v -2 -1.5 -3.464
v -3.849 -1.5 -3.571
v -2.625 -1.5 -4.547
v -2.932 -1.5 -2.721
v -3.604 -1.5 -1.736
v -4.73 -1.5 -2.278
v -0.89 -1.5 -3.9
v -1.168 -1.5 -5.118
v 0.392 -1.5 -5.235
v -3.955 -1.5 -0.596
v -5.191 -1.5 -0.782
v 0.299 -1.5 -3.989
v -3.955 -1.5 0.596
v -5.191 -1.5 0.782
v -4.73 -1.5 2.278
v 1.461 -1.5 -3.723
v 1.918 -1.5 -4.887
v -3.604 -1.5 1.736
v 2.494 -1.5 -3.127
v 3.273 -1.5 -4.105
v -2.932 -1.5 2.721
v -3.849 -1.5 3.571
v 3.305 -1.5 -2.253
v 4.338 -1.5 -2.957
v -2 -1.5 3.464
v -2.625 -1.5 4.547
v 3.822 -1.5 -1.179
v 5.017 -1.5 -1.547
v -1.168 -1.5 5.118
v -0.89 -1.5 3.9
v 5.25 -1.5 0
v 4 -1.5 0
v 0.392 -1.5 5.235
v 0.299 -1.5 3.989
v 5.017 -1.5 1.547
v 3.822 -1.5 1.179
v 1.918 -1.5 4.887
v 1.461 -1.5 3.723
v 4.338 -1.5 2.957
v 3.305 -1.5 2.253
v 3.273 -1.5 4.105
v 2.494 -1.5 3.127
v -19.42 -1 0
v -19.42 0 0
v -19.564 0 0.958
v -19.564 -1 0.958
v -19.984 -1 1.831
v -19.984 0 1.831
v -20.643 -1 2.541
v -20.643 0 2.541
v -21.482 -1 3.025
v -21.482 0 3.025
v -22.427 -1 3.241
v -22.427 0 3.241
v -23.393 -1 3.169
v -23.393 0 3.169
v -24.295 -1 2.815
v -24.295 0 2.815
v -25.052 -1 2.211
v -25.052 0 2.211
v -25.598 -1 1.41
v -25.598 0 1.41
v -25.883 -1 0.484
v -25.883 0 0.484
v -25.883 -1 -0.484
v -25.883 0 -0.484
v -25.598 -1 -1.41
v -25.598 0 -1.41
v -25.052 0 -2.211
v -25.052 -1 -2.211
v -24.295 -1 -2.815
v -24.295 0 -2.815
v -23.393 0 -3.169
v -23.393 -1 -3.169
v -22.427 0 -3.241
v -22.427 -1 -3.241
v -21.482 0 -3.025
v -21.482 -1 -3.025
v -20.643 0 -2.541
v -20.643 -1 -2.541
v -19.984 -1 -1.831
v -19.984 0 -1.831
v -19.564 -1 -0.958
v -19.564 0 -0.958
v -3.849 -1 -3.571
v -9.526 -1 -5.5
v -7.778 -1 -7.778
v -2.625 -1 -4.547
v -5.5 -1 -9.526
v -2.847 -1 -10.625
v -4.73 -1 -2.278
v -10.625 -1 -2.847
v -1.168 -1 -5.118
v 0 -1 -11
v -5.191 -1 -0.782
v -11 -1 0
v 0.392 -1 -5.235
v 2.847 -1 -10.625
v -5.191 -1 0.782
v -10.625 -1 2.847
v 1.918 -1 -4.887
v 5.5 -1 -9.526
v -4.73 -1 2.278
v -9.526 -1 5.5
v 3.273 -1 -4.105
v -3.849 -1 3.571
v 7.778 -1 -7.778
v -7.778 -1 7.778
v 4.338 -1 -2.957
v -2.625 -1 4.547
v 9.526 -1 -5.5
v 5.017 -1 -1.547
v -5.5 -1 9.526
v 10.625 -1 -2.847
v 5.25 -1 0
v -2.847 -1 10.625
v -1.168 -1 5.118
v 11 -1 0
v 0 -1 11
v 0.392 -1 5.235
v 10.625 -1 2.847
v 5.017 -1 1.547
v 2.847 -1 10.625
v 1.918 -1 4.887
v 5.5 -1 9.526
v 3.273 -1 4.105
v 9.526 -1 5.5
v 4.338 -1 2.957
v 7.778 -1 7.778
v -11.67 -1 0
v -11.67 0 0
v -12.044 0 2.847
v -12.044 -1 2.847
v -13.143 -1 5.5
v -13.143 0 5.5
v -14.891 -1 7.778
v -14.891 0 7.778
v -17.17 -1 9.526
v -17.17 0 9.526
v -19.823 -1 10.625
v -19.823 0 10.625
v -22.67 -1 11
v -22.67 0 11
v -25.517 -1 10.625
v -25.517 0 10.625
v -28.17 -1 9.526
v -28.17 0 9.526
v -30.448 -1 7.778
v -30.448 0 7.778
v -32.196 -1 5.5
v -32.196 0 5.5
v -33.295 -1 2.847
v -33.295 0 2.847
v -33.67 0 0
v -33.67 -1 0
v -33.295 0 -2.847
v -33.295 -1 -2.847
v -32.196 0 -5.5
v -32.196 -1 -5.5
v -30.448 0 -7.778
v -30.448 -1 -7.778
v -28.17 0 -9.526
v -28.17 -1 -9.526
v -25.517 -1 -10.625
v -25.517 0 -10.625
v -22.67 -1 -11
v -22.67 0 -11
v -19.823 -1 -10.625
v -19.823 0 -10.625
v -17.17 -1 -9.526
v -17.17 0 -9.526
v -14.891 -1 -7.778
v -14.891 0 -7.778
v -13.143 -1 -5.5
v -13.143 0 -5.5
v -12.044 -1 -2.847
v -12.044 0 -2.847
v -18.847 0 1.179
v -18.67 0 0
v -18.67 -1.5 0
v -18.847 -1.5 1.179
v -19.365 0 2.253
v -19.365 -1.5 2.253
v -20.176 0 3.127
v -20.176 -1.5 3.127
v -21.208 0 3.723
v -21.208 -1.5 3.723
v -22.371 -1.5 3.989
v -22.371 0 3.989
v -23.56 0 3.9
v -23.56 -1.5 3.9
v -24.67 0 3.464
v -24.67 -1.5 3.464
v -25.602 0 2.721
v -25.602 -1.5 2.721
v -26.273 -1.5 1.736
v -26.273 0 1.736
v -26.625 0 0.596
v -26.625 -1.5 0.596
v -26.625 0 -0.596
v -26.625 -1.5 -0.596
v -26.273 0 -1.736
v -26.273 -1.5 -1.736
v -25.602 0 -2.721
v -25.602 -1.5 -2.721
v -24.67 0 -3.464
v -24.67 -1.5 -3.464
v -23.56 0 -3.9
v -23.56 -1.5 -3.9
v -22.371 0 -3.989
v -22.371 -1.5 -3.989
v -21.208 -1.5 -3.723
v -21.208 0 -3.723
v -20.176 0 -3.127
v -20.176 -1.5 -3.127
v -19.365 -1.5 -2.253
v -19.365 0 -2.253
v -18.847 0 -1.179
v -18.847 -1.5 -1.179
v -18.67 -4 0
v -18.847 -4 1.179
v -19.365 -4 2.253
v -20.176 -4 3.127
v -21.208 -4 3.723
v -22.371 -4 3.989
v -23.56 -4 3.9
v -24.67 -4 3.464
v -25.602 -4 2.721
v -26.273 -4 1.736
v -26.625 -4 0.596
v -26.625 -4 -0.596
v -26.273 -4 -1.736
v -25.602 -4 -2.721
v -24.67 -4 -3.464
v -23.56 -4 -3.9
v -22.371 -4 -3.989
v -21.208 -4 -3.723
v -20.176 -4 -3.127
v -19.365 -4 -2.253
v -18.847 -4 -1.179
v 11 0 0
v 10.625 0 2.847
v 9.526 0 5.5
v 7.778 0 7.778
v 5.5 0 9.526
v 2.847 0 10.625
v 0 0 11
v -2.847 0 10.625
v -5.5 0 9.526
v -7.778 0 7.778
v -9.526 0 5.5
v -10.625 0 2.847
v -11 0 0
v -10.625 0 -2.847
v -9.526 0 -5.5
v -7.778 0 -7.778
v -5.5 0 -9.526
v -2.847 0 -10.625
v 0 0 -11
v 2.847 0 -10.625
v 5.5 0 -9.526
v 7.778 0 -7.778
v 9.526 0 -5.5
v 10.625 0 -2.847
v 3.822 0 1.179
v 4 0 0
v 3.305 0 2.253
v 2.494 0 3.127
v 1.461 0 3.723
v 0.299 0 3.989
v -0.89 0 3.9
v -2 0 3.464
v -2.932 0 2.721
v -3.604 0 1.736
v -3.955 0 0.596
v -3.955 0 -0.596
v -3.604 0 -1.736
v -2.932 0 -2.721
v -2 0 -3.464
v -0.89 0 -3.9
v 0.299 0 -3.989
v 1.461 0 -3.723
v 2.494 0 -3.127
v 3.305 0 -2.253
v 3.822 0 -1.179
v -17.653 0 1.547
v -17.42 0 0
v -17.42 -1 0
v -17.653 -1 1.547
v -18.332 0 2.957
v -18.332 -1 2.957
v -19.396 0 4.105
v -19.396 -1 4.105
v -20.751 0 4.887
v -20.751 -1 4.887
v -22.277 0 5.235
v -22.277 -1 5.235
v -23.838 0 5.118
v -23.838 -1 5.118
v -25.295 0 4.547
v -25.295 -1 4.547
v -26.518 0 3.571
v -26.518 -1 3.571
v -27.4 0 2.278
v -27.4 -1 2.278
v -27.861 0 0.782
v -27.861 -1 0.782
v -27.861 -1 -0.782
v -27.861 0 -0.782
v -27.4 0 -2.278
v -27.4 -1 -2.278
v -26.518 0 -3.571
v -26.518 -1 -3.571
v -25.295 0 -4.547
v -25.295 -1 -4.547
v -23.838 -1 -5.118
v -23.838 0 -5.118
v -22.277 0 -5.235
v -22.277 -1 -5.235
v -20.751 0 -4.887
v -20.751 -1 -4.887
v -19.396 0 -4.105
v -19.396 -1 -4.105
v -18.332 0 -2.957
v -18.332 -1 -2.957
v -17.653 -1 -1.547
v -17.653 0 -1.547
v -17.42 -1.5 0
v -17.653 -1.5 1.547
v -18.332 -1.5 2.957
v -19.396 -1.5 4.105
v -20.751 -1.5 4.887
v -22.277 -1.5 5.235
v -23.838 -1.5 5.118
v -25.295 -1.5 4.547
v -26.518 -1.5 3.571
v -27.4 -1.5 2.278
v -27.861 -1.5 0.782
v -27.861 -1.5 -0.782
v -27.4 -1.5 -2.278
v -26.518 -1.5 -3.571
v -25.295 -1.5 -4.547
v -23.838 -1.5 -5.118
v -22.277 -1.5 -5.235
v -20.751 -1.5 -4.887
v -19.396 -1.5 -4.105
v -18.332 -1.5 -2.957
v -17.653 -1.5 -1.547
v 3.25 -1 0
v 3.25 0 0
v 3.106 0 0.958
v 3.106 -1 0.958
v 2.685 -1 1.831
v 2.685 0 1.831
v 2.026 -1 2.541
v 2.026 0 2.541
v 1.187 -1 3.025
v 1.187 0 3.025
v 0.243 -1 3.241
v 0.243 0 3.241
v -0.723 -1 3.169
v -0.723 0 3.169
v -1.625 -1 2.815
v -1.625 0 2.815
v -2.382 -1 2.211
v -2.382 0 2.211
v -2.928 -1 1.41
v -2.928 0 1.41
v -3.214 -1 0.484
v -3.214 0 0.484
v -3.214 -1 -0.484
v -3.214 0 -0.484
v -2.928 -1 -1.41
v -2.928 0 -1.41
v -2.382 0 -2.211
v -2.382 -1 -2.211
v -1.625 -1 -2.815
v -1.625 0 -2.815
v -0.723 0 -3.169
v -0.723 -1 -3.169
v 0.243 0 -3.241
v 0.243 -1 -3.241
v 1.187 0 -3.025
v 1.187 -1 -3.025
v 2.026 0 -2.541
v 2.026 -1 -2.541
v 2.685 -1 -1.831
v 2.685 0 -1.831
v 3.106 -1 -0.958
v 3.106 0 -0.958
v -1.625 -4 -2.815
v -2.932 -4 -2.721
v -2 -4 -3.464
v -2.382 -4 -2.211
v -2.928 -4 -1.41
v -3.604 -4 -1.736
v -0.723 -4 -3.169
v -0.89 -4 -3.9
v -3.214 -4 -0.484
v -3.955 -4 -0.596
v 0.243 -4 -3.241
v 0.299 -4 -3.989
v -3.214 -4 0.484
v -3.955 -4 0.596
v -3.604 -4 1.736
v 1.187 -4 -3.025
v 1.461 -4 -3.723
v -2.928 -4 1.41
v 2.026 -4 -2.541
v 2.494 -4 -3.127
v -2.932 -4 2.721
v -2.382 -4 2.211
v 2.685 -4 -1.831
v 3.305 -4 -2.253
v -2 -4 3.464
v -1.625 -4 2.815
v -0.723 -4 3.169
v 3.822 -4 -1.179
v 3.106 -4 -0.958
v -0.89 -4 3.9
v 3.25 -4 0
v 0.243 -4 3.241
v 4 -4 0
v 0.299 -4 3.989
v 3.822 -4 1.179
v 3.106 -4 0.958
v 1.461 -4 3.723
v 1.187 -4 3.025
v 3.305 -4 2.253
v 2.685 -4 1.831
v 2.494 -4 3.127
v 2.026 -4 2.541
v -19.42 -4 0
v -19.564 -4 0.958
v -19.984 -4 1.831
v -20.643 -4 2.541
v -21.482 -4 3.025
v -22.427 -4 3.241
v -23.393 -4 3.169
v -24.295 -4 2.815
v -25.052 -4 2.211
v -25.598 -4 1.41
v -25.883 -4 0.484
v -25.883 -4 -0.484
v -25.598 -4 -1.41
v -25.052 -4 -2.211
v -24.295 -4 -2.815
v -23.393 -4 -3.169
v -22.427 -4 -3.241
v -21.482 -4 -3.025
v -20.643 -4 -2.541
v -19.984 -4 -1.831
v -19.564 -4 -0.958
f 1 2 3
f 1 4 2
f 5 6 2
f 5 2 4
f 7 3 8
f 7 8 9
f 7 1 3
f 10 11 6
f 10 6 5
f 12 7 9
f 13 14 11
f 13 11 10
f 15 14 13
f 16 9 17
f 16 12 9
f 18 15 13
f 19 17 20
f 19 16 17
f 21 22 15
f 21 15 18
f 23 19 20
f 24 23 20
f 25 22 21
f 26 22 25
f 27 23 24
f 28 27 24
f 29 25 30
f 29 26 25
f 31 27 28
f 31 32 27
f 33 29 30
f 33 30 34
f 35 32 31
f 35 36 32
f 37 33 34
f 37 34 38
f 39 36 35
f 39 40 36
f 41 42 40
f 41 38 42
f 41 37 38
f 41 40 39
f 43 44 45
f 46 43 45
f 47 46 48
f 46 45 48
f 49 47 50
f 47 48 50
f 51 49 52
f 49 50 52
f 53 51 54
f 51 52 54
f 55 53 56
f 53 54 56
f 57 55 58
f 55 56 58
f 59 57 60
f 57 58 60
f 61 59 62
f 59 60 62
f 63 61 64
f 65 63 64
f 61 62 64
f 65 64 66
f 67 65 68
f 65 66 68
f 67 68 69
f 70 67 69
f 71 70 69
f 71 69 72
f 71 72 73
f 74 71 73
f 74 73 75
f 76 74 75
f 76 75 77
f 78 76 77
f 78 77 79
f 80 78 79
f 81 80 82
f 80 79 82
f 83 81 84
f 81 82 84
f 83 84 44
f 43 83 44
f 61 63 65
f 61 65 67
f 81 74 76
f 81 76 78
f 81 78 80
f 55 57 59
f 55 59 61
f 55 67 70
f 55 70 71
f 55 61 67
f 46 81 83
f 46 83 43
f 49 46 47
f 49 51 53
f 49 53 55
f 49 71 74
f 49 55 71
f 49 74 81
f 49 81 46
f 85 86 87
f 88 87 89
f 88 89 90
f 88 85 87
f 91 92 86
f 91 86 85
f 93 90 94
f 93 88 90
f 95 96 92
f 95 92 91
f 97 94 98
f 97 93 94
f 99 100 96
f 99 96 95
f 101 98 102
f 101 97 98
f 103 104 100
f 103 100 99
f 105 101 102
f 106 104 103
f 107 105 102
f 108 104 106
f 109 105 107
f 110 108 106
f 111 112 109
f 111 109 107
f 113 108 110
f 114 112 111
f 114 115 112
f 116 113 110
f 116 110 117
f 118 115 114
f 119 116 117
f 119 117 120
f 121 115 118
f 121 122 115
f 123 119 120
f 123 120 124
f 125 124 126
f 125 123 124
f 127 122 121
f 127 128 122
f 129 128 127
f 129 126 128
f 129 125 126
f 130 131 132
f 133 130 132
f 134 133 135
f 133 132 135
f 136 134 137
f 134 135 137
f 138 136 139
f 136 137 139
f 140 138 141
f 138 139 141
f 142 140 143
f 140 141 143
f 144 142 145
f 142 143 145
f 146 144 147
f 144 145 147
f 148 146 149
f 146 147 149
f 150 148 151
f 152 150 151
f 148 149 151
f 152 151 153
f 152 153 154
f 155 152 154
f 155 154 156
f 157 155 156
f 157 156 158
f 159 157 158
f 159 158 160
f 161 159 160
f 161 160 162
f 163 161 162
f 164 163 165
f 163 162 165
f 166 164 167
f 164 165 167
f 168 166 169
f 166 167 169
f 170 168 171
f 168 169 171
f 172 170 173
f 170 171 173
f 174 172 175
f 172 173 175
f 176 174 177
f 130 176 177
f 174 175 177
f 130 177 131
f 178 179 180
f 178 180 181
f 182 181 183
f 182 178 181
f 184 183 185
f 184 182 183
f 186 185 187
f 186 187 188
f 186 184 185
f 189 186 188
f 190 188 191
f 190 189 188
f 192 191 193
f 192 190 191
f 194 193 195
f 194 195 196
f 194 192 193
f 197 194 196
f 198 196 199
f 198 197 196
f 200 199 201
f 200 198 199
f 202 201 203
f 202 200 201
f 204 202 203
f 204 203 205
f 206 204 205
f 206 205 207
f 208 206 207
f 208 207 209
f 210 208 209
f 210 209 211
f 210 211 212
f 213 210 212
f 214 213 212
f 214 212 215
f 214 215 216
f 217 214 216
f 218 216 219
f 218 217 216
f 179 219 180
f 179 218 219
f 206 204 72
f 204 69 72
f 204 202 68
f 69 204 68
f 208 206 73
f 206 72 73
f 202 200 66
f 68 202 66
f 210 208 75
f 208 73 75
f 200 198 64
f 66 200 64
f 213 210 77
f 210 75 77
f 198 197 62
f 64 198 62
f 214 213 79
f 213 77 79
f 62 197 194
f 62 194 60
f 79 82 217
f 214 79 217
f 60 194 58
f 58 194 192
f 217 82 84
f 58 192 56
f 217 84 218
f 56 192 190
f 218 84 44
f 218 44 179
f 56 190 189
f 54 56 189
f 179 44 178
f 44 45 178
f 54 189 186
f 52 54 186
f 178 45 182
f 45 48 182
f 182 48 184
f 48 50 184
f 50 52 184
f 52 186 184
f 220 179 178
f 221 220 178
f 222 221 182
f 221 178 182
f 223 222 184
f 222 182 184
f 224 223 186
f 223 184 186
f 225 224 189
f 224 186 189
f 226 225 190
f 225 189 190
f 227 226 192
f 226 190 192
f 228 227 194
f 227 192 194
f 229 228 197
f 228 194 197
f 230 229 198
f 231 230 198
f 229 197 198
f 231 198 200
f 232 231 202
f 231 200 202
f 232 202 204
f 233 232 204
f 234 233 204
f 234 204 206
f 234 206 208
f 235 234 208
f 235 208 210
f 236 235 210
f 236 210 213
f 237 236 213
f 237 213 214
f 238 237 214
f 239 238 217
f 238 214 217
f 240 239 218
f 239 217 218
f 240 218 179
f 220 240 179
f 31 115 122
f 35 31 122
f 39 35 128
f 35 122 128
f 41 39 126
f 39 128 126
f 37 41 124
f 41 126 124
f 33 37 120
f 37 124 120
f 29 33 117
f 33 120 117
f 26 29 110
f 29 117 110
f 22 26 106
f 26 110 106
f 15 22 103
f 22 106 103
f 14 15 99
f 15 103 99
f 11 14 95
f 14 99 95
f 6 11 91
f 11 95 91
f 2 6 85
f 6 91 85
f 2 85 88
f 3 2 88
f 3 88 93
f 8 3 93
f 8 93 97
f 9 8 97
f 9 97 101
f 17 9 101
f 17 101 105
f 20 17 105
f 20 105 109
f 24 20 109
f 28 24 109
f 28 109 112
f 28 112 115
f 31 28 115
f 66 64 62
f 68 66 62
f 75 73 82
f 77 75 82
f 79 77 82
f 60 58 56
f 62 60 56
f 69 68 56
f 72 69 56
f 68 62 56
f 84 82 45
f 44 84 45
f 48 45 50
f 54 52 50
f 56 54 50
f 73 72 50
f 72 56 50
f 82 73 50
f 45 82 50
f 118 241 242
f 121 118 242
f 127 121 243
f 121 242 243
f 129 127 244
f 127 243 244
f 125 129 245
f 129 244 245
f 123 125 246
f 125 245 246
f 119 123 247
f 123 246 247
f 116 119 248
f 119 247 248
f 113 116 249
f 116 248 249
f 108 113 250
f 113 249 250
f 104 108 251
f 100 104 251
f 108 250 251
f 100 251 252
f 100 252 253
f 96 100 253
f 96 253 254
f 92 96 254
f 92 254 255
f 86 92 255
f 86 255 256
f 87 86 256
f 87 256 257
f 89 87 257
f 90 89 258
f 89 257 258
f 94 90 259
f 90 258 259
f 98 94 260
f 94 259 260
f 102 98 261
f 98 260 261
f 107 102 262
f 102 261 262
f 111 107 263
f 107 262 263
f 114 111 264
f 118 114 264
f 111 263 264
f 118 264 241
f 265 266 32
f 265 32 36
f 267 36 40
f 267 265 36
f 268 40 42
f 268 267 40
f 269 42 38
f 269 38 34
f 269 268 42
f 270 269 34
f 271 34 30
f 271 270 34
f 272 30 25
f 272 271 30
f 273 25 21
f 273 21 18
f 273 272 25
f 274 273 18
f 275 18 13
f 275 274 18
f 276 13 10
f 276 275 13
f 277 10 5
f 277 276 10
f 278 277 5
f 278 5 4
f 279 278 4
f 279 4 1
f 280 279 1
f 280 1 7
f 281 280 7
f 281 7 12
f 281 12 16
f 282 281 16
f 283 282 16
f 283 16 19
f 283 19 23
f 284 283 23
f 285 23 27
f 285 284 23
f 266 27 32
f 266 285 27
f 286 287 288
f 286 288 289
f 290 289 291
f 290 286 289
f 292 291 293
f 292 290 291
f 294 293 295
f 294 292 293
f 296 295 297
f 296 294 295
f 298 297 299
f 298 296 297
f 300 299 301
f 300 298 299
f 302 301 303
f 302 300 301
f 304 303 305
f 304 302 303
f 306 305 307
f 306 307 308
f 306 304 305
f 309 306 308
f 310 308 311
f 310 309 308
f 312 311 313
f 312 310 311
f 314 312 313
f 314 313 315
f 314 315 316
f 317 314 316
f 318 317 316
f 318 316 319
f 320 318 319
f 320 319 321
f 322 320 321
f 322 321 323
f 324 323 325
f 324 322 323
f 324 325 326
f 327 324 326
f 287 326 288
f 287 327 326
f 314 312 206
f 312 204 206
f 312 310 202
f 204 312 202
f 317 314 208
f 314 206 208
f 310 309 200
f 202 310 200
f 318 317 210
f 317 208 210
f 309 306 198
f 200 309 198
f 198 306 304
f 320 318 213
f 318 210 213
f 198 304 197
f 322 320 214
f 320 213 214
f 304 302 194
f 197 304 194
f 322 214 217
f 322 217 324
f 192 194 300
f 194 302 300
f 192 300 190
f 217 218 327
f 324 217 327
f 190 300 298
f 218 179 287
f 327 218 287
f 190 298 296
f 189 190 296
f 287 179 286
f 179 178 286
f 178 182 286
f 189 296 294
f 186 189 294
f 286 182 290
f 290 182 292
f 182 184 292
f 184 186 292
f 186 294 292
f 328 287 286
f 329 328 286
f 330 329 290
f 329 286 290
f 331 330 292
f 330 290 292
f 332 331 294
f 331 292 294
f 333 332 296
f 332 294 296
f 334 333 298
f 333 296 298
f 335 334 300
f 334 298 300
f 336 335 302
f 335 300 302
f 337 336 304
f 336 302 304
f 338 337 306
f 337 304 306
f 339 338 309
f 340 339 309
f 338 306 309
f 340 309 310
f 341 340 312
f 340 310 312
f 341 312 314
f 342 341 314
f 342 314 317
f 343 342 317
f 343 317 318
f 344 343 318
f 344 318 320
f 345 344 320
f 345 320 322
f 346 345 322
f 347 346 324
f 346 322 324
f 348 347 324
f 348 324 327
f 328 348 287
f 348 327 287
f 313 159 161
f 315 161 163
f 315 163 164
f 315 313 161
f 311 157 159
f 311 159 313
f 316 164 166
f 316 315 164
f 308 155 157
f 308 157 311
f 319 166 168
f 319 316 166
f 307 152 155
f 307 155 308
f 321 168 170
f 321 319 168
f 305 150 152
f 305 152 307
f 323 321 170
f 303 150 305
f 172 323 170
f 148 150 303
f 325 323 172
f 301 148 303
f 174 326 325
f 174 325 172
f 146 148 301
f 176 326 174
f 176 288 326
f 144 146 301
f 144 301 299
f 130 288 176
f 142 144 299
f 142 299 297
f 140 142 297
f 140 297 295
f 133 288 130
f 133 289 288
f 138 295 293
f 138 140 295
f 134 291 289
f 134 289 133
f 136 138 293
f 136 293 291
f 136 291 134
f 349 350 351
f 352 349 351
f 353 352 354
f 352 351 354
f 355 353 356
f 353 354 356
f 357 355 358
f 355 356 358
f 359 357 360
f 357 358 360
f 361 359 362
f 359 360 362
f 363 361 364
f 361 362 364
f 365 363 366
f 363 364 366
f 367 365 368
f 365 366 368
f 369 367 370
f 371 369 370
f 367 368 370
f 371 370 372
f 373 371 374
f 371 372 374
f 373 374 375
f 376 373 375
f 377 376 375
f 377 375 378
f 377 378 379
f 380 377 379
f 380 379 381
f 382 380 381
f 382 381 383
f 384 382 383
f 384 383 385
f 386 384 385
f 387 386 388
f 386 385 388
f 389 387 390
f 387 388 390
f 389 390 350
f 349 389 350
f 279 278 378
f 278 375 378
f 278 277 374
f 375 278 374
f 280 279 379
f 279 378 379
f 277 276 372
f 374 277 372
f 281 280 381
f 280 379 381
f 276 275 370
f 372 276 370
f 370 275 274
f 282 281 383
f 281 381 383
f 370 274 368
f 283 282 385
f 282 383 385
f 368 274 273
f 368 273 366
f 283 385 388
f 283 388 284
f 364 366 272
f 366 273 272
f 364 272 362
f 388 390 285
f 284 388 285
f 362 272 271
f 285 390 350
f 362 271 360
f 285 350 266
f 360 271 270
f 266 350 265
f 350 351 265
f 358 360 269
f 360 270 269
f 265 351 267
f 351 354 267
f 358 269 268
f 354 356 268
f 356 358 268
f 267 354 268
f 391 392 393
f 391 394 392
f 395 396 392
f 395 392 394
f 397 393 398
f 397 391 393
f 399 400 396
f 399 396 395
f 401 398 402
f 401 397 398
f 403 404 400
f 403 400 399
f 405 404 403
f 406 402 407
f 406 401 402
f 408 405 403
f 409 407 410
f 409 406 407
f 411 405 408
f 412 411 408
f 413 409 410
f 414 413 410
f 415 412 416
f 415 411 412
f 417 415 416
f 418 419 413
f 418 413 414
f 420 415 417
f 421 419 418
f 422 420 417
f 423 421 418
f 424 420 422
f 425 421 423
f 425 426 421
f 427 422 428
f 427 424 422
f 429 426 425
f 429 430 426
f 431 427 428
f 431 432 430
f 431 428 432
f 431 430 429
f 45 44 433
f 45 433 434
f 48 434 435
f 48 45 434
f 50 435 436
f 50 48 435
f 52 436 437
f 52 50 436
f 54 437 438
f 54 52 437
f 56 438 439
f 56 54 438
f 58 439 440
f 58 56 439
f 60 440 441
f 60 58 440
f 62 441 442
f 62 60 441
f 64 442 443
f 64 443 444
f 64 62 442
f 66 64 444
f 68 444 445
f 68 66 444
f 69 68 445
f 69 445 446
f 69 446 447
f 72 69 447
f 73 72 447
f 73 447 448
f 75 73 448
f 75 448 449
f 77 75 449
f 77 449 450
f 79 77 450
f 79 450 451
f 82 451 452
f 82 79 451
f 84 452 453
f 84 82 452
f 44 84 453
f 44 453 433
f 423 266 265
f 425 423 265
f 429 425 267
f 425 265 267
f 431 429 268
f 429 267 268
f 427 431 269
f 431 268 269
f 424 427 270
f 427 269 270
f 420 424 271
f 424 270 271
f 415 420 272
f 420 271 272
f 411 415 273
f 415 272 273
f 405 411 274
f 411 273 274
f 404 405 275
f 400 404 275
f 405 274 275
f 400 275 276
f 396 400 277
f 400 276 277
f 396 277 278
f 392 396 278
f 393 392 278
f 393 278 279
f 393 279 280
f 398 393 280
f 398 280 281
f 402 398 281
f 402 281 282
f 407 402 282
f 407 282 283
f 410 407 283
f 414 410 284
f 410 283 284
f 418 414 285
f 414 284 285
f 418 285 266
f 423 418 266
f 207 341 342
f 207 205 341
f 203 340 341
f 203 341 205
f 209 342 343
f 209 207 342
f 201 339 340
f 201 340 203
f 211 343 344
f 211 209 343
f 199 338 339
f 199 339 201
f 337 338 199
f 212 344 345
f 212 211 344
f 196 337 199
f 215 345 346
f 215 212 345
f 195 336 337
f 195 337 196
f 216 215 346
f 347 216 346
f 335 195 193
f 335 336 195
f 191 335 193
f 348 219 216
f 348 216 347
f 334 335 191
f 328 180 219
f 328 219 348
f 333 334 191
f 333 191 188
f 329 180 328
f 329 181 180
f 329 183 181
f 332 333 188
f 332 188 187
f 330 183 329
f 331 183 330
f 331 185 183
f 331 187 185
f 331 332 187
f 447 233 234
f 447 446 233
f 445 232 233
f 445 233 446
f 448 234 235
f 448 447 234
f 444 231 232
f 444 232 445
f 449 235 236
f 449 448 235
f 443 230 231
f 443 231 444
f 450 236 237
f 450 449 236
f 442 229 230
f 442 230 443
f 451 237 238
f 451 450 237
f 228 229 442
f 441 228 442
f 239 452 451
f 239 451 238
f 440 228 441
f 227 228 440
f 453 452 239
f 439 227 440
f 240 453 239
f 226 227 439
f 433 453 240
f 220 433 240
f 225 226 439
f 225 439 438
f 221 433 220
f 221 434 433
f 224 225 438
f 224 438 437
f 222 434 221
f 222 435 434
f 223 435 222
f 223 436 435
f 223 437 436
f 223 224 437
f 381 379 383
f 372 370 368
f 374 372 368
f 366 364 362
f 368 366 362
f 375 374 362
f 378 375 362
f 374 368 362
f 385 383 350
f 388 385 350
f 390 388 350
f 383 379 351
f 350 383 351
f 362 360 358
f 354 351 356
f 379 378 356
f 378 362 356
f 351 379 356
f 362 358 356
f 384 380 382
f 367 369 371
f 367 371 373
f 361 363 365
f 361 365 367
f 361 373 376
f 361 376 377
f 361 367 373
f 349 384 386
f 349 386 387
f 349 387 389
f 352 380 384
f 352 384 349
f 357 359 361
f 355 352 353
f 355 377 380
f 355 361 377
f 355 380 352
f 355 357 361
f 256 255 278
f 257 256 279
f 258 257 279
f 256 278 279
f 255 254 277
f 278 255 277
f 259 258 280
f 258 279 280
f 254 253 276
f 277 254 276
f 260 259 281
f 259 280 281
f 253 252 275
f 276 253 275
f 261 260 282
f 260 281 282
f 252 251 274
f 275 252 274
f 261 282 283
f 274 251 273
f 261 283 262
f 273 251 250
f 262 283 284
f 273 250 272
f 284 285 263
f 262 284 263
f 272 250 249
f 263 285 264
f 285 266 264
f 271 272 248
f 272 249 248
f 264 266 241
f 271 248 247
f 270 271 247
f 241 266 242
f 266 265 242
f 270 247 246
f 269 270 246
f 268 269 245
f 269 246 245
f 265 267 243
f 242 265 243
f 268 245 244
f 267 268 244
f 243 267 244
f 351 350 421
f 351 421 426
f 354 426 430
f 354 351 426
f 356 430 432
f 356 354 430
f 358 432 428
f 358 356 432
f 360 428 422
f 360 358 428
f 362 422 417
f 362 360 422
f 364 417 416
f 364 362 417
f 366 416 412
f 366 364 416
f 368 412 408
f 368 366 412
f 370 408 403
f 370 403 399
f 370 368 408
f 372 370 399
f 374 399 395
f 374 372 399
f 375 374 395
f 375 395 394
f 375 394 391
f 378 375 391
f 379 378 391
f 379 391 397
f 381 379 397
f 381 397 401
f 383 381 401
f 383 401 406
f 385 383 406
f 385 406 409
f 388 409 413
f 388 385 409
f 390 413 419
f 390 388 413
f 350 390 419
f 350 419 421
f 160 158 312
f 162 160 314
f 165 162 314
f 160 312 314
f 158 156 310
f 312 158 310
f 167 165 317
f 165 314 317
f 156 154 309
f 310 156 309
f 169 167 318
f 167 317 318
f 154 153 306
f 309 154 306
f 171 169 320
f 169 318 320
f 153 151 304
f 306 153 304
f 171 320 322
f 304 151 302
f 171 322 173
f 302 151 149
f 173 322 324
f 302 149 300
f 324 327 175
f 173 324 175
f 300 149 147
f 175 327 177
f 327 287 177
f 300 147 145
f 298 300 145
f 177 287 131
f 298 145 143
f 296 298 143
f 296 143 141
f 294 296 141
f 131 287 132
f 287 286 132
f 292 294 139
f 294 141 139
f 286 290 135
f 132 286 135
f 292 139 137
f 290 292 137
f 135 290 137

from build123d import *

# Parameters (mm, degrees)
F0_R     = 11
F0_R_2   = 5.25
F1_DEPTH = 1
F0_R_3   = 3.25
F0_R_4   = 4
F2_DEPTH = 1.5
F3_DEPTH = 4


with BuildPart() as f1:
    # F0 (on Front) → F1 (new body)
    with BuildSketch(Plane.XZ):
        Circle(F0_R)
        Circle(F0_R_2, mode=Mode.SUBTRACT)
    extrude(amount=F1_DEPTH)

    # F0 (on Front) → F2 (join)
    with BuildSketch(Plane.XZ):
        Circle(F0_R_2)
        Circle(F0_R_4, mode=Mode.SUBTRACT)
    extrude(amount=F2_DEPTH)


with BuildPart() as f1b:
    # F0 (on Front) → F1, piece 2 (new body)
    with BuildSketch(Plane.XZ):
        Circle(F0_R_3)
    extrude(amount=F1_DEPTH)


with BuildPart() as f1c:
    # F0 (on Front) → F1, piece 3 (new body)
    with BuildSketch(Plane.XZ):
        with Locations((-22.6695239544, 0)):
            Circle(F0_R)
        with Locations((-22.6695239544, 0)):
            Circle(F0_R_2, mode=Mode.SUBTRACT)
    extrude(amount=F1_DEPTH)


with BuildPart() as f1d:
    # F0 (on Front) → F1, piece 4 (new body)
    with BuildSketch(Plane.XZ):
        with Locations((-22.6695239544, 0)):
            Circle(F0_R_3)
    extrude(amount=F1_DEPTH)


with BuildPart() as f2:
    # F0 (on Front) → F2, piece 2 (new body)
    with BuildSketch(Plane.XZ):
        with Locations((-22.6695239544, 0)):
            Circle(F0_R_2)
        with Locations((-22.6695239544, 0)):
            Circle(F0_R_4, mode=Mode.SUBTRACT)
    extrude(amount=F2_DEPTH)


with BuildPart() as f3:
    # F0 (on Front) → F3 (new body)
    with BuildSketch(Plane.XZ):
        Circle(F0_R_4)
        Circle(F0_R_3, mode=Mode.SUBTRACT)
    extrude(amount=F3_DEPTH)


with BuildPart() as f3b:
    # F0 (on Front) → F3, piece 2 (new body)
    with BuildSketch(Plane.XZ):
        with Locations((-22.6695239544, 0)):
            Circle(F0_R_4)
        with Locations((-22.6695239544, 0)):
            Circle(F0_R_3, mode=Mode.SUBTRACT)
    extrude(amount=F3_DEPTH)


solid = Compound([f1.part, f1b.part, f1c.part, f1d.part, f2.part, f3.part, f3b.part])
